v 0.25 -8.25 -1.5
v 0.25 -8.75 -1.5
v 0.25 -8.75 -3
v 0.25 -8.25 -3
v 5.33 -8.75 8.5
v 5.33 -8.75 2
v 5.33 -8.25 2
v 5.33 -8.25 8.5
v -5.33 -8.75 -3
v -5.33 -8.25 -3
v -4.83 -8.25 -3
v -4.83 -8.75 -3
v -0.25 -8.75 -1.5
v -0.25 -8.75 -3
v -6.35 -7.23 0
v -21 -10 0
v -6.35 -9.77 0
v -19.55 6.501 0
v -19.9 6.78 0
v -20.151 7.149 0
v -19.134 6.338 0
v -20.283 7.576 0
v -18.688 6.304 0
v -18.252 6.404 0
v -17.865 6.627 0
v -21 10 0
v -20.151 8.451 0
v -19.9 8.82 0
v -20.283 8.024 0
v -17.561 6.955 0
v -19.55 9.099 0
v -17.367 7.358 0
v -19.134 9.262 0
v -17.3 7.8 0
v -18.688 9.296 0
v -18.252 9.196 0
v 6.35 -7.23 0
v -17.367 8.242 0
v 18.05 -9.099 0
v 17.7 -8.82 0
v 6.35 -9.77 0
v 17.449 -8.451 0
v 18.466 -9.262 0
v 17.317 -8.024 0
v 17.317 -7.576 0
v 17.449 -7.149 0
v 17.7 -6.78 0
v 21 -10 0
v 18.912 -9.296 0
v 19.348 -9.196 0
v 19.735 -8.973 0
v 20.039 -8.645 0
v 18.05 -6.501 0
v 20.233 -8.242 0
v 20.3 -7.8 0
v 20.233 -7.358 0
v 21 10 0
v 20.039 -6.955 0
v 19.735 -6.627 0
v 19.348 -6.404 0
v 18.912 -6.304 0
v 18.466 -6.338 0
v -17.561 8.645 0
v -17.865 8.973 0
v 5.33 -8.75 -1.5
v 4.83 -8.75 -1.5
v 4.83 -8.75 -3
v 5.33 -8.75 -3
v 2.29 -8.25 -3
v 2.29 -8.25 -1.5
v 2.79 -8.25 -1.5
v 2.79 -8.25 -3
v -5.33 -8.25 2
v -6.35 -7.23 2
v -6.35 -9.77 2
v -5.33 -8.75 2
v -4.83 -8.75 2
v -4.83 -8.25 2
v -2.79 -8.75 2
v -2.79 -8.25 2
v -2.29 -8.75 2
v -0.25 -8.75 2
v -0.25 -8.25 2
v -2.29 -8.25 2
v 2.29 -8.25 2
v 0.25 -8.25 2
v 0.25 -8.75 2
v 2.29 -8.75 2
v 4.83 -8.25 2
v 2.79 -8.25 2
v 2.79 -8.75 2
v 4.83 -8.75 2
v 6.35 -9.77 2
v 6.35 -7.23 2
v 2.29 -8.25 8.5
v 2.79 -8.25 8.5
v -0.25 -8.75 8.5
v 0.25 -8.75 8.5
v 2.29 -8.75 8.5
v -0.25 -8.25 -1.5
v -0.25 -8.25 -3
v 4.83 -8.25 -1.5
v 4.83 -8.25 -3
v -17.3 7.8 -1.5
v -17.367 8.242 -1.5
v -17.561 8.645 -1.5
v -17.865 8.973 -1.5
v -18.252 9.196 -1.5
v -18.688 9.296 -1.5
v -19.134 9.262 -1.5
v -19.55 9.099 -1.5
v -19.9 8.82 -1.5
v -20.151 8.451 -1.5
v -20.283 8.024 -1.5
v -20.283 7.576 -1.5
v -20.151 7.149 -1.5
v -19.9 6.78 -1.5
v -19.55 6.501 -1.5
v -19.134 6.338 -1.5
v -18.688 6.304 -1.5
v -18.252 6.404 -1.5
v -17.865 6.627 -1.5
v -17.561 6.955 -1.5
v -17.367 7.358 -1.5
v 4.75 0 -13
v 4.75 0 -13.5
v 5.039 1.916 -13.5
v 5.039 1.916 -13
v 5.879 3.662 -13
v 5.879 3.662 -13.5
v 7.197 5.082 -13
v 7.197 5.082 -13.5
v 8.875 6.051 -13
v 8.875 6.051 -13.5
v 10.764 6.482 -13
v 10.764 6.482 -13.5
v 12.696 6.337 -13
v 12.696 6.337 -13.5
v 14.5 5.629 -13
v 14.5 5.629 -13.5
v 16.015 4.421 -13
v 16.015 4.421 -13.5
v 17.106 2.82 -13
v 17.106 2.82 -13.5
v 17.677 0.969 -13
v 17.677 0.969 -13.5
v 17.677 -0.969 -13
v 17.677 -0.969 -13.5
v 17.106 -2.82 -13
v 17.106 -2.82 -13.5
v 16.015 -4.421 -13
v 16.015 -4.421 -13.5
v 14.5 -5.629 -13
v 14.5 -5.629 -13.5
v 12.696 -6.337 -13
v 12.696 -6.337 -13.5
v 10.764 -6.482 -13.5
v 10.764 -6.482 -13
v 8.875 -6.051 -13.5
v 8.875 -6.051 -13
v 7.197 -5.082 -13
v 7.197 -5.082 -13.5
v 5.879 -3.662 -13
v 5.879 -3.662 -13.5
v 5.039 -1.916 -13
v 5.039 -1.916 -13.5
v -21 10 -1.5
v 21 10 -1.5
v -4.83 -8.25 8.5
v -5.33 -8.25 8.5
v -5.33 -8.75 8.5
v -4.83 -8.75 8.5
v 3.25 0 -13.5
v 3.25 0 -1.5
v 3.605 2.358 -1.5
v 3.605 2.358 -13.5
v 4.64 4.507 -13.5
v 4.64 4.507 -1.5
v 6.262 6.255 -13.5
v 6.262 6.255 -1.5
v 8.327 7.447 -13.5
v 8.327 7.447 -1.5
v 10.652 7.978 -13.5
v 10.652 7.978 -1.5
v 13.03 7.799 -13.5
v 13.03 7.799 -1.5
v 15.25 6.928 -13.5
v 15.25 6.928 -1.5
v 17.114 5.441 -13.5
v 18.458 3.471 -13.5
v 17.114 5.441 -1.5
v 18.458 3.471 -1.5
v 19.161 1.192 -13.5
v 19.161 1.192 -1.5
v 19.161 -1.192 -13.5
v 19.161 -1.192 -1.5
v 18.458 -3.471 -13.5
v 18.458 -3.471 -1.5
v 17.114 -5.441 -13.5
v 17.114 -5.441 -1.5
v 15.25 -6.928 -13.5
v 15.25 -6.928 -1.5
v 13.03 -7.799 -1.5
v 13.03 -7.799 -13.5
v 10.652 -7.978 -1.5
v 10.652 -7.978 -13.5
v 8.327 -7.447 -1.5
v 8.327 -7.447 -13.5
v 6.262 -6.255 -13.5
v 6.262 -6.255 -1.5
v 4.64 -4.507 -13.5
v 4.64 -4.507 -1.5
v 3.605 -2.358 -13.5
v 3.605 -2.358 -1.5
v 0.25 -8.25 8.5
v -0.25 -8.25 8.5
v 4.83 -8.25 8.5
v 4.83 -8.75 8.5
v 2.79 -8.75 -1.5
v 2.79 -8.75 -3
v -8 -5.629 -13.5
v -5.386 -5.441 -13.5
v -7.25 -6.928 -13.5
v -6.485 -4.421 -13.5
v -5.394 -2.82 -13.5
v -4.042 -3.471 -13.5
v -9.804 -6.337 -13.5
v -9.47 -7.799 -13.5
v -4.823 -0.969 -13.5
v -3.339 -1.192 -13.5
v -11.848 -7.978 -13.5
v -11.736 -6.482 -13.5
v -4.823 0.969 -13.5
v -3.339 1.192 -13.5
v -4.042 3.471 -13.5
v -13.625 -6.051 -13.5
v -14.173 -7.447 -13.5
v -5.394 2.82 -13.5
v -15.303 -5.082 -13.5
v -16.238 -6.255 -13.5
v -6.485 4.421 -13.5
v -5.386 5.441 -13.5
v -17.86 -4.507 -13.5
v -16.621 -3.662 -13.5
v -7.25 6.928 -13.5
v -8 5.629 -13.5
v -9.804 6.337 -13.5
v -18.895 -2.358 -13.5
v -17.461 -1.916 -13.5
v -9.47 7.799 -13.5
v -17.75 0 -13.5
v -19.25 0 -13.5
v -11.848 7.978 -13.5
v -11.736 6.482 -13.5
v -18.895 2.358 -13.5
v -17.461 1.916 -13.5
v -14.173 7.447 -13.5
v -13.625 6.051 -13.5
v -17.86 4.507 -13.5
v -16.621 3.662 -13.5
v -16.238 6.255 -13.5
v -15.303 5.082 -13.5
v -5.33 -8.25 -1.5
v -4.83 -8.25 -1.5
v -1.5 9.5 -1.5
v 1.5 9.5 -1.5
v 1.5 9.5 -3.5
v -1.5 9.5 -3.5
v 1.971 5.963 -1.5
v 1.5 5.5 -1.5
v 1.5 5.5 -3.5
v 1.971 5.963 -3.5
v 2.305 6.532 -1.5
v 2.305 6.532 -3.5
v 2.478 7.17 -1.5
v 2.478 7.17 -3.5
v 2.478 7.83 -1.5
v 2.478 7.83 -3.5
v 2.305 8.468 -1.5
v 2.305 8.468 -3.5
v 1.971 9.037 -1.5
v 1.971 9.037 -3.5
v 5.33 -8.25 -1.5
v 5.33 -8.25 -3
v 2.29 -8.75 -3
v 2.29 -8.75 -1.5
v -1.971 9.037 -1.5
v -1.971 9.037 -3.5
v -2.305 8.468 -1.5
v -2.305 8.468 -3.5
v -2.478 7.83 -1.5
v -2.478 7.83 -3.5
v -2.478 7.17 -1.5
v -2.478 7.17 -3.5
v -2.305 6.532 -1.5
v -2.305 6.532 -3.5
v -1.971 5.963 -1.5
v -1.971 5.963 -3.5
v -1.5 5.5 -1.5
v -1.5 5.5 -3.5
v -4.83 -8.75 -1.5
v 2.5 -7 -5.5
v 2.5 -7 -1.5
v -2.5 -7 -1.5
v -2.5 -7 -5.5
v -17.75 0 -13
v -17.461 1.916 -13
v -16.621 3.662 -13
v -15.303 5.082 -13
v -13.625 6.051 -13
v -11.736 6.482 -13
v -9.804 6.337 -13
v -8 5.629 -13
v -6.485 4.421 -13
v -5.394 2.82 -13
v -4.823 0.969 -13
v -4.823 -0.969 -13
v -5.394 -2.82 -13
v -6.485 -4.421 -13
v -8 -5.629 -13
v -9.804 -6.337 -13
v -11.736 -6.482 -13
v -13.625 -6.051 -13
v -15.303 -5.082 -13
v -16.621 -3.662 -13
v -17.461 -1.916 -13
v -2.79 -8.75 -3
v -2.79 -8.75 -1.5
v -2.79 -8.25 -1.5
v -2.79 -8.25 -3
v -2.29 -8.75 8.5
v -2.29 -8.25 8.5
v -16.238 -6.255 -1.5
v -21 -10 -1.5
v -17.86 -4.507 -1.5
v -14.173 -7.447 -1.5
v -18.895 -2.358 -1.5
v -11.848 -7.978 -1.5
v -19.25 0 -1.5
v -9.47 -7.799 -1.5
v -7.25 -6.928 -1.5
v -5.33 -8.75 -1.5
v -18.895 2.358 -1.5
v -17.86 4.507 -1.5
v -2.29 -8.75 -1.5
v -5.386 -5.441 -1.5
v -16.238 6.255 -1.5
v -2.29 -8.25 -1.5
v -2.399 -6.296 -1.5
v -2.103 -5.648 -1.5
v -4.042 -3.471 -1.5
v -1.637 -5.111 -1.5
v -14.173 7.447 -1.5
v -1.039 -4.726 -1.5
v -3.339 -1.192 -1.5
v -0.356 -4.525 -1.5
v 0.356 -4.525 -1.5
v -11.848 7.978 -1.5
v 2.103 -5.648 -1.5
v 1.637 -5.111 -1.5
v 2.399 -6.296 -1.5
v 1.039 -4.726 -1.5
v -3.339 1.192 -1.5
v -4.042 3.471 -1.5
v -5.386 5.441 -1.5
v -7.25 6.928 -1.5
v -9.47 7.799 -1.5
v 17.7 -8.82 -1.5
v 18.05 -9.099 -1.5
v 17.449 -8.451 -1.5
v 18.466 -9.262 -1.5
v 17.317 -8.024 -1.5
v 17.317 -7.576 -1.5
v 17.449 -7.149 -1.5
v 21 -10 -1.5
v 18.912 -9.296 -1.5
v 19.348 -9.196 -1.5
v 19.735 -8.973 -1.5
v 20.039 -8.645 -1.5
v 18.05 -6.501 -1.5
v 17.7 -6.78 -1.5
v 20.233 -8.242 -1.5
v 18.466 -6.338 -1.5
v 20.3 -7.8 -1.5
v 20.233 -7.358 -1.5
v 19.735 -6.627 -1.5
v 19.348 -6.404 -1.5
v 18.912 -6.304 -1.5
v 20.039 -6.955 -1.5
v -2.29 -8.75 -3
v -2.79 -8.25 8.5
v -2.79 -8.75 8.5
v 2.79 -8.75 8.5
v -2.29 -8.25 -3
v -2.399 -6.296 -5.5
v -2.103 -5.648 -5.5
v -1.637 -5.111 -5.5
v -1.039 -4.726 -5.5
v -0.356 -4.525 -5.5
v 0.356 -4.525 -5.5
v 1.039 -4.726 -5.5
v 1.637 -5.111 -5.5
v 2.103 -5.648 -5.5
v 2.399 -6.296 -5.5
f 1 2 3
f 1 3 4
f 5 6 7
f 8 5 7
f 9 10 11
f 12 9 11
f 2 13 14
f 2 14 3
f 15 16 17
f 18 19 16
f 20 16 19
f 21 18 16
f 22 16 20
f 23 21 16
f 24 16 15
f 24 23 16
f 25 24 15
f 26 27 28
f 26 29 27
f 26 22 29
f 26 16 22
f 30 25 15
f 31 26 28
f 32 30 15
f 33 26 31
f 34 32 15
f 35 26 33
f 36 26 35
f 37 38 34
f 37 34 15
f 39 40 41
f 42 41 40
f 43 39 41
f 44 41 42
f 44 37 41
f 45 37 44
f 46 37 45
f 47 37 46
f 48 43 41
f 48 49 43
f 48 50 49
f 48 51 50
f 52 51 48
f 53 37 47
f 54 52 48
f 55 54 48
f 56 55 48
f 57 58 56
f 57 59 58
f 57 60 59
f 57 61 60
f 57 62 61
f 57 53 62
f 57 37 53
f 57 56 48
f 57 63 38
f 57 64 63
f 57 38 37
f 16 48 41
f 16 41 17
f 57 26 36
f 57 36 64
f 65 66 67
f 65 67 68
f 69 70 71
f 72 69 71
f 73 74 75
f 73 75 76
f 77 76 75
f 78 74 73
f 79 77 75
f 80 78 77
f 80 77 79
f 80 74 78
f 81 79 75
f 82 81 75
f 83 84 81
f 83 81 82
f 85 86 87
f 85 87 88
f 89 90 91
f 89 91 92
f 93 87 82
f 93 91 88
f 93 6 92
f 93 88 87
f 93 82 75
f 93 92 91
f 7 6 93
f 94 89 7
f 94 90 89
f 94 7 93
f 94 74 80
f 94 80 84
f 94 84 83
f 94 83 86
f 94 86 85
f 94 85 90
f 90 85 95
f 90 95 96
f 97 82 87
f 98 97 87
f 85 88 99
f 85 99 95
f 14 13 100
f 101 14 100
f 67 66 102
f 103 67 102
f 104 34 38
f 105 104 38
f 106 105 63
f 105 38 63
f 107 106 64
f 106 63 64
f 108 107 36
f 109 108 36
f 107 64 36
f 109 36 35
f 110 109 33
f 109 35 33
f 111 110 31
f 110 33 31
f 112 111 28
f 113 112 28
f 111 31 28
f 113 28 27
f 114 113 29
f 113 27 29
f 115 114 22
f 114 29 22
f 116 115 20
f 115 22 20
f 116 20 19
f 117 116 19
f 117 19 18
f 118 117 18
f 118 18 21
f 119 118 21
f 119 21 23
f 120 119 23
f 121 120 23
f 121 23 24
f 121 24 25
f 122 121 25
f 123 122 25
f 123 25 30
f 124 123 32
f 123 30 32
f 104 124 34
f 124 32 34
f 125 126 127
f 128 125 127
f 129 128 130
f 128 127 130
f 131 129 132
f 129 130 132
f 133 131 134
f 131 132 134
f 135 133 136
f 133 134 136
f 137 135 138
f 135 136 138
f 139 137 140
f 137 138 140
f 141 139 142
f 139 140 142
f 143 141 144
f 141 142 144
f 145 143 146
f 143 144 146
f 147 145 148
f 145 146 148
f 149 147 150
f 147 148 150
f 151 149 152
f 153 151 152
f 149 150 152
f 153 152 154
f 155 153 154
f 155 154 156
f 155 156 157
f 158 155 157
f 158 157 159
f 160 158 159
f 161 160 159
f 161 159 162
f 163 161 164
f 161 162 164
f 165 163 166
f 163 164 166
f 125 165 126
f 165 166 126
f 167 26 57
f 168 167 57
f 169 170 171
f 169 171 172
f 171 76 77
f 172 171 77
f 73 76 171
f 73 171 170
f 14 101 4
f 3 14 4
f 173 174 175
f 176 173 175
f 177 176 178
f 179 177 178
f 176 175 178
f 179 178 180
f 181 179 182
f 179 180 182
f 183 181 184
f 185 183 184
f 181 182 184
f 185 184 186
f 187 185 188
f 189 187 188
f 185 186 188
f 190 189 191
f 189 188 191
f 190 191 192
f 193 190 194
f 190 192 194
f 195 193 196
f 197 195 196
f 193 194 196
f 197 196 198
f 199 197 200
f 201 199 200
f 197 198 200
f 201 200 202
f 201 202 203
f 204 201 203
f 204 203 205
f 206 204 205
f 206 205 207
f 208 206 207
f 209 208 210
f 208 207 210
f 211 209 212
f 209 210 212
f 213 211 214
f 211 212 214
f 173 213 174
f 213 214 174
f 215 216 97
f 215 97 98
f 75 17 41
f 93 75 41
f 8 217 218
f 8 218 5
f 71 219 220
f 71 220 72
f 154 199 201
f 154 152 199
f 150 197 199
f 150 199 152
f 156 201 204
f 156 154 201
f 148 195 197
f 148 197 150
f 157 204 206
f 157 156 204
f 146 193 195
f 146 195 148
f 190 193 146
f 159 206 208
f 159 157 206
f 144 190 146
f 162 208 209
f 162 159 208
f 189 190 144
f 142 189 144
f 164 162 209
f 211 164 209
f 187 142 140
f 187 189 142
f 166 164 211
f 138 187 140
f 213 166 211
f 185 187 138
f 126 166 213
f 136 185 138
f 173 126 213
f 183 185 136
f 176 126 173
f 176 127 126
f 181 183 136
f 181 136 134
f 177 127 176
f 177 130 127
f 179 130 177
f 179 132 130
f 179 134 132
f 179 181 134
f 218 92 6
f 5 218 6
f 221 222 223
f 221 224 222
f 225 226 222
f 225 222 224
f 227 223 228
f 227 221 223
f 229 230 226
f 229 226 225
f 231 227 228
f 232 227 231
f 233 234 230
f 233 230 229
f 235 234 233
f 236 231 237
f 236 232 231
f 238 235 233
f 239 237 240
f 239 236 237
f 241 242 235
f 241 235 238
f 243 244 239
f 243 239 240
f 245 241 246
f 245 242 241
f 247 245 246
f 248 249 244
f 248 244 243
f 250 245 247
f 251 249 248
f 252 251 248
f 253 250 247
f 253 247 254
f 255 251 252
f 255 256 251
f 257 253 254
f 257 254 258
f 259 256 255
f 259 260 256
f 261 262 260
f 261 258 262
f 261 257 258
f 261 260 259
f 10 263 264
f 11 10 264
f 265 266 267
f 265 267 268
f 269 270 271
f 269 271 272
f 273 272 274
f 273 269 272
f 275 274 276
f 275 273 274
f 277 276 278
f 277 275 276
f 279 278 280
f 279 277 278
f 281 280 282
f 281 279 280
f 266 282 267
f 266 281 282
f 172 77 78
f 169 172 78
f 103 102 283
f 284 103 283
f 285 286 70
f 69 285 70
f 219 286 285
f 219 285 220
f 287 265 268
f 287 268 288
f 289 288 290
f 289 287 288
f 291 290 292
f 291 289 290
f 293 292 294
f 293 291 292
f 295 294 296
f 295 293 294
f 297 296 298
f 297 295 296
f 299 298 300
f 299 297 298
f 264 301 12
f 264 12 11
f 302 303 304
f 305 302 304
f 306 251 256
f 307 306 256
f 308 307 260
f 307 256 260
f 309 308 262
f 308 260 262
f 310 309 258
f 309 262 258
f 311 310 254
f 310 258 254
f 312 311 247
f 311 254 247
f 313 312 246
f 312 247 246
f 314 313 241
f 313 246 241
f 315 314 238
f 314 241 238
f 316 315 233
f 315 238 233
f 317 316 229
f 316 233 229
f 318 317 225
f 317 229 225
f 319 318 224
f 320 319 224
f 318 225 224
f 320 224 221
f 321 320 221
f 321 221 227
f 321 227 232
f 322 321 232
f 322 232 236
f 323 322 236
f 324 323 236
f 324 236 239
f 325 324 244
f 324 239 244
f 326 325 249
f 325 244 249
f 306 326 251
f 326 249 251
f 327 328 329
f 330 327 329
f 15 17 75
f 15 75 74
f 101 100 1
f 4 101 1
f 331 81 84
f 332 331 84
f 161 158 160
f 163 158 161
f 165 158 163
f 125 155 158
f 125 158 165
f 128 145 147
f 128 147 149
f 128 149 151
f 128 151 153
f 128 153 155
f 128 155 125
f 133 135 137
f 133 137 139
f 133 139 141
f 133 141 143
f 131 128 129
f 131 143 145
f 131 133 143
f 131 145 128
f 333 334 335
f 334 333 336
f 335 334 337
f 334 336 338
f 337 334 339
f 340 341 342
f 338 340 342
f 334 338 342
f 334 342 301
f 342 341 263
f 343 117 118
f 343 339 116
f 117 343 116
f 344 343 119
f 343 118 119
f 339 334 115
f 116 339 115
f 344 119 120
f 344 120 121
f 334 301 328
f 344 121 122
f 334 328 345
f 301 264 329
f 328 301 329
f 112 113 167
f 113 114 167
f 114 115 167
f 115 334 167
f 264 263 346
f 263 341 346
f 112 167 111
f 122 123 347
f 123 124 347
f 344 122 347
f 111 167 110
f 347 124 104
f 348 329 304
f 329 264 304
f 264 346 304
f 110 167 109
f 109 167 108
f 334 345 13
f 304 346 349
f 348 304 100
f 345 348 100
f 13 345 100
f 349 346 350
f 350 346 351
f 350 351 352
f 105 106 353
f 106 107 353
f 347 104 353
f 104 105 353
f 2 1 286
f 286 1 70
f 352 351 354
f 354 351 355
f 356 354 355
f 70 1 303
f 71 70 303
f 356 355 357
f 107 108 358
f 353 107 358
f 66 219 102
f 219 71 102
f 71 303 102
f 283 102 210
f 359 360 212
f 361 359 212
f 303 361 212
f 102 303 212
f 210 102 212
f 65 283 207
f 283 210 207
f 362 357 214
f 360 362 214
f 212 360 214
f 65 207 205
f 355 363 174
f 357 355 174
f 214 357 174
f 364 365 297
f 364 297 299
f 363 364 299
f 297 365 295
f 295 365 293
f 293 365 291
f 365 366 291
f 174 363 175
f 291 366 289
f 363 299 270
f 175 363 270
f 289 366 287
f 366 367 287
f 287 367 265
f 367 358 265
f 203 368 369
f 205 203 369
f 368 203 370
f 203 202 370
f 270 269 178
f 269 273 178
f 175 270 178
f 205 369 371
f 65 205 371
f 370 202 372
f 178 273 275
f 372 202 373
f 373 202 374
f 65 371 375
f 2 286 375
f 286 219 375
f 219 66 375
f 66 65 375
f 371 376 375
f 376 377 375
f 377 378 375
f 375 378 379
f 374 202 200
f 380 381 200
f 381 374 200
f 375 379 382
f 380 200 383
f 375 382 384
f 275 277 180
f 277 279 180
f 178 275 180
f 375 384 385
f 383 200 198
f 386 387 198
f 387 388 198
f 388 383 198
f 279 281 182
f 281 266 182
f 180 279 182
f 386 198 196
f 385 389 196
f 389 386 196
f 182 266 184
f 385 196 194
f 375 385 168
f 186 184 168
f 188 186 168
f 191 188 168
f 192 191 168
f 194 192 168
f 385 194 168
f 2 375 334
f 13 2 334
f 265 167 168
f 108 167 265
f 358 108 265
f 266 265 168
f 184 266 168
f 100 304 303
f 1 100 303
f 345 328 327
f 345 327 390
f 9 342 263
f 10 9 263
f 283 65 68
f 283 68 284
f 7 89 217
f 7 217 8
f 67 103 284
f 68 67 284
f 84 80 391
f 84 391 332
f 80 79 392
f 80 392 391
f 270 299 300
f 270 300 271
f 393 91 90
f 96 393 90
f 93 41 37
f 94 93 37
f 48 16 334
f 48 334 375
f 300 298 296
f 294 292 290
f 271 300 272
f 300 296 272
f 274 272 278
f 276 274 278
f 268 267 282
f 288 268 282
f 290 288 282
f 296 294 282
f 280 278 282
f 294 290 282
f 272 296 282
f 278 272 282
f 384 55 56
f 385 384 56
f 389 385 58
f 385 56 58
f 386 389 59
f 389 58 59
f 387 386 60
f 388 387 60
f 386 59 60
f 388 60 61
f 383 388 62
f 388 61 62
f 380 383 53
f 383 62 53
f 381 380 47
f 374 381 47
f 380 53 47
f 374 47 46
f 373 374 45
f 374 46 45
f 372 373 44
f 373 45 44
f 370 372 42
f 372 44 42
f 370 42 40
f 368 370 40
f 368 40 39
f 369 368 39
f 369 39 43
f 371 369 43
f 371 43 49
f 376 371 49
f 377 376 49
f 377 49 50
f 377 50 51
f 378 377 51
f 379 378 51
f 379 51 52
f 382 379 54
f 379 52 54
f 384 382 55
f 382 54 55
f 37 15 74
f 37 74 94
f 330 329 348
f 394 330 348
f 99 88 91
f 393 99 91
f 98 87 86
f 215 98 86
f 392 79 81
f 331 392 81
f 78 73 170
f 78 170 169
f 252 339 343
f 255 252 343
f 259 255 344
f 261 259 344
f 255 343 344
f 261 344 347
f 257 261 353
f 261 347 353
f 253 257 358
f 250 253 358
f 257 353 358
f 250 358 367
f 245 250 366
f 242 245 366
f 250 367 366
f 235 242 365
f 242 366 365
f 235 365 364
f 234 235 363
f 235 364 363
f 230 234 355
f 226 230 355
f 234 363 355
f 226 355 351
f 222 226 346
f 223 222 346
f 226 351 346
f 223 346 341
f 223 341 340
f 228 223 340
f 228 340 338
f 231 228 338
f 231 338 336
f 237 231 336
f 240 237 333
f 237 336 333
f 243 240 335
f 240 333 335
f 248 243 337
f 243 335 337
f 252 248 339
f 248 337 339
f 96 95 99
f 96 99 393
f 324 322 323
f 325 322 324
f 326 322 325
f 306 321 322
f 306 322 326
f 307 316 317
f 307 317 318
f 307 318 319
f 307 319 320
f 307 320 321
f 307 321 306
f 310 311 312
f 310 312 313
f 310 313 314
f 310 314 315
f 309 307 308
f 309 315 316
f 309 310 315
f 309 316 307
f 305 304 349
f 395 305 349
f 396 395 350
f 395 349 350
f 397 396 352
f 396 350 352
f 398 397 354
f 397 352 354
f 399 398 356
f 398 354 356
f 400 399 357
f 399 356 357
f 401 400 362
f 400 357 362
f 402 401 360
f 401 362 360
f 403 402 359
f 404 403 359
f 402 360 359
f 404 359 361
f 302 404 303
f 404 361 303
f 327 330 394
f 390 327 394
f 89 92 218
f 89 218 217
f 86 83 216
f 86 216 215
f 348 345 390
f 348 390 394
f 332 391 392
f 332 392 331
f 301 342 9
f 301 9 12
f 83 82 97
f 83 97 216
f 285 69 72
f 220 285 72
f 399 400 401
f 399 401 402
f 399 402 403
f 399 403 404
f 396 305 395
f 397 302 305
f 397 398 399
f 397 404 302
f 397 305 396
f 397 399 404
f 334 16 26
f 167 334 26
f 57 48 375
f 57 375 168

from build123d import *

# Parameters (mm, degrees)
CROQUIS1_W                   = 42
CROQUIS1_H                   = 20
CROQUIS1_R                   = 1.5
SALIENTE_EXTRUIR1_DEPTH      = 1.5
CROQUIS2_R                   = 8
SALIENTE_EXTRUIR2_DEPTH      = 12
CROQUIS3_R                   = 6.5
CORTAR_EXTRUIR1_DEPTH        = 0.5
CROQUIS5_W                   = 0.5
CROQUIS5_H                   = 0.5
SALIENTE_EXTRUIR3_DEPTH      = 8.5
SALIENTE_EXTRUIR3_DEPTH_BACK = 3
CROQUIS6_W                   = 12.7
CROQUIS6_H                   = 2.54
SALIENTE_EXTRUIR4_DEPTH      = 2
SALIENTE_EXTRUIR5_DEPTH      = 4
SALIENTE_EXTRUIR6_DEPTH      = 2


with BuildPart() as part:
    # Croquis1 → Saliente-Extruir1 (new body)
    with BuildSketch(Plane.XY):
        Rectangle(CROQUIS1_W, CROQUIS1_H)
        with Locations((-18.8, 7.8)):
            Circle(CROQUIS1_R, mode=Mode.SUBTRACT)
        with Locations((18.8, -7.8)):
            Circle(CROQUIS1_R, mode=Mode.SUBTRACT)
    extrude(amount=-SALIENTE_EXTRUIR1_DEPTH)

    # Croquis2 → Saliente-Extruir2 (add)
    with BuildSketch(Plane(origin=(0, 0, -1.5), x_dir=(-1, 0, 0), z_dir=(0, 0, -1))):
        with Locations((-11.25, 0)):
            Circle(CROQUIS2_R)
        with Locations((11.25, 0)):
            Circle(CROQUIS2_R)
    extrude(amount=SALIENTE_EXTRUIR2_DEPTH)

    # Croquis3 → Cortar-Extruir1 (cut)
    with BuildSketch(Plane(origin=(0, 0, -13.5), x_dir=(-1, 0, 0), z_dir=(0, 0, -1))):
        with Locations((-11.25, 0)):
            Circle(CROQUIS3_R)
        with Locations((11.25, 0)):
            Circle(CROQUIS3_R)
    extrude(amount=-CORTAR_EXTRUIR1_DEPTH, mode=Mode.SUBTRACT)

    # Croquis5 → Saliente-Extruir3 (add, two sides)
    with BuildSketch(Plane.XY) as saliente_extruir3_sk:
        with Locations((0, -8.5)):
            Rectangle(CROQUIS5_W, CROQUIS5_H)
        with Locations((-2.54, -8.5)):
            Rectangle(CROQUIS5_W, CROQUIS5_H)
        with Locations((-5.08, -8.5)):
            Rectangle(CROQUIS5_W, CROQUIS5_H)
        with Locations((2.54, -8.5)):
            Rectangle(CROQUIS5_W, CROQUIS5_H)
        with Locations((5.08, -8.5)):
            Rectangle(CROQUIS5_W, CROQUIS5_H)
    extrude(amount=SALIENTE_EXTRUIR3_DEPTH)
    extrude(saliente_extruir3_sk.sketch, amount=-SALIENTE_EXTRUIR3_DEPTH_BACK)

    # Croquis6 → Saliente-Extruir4 (add)
    with BuildSketch(Plane.XY):
        with Locations((0, -8.5)):
            Rectangle(CROQUIS6_W, CROQUIS6_H)
    extrude(amount=SALIENTE_EXTRUIR4_DEPTH)

    # Croquis7 → Saliente-Extruir5 (add)
    with BuildSketch(Plane(origin=(0, 0, -1.5), x_dir=(-1, 0, 0), z_dir=(0, 0, -1))):
        with BuildLine():
            Line((-2.5, -7), (0, -7))
            Line((0, -7), (2.5, -7))
            ThreePointArc((2.5, -7), (0, -4.5), (-2.5, -7))
        make_face()
    extrude(amount=SALIENTE_EXTRUIR5_DEPTH)

    # Croquis8 → Saliente-Extruir6 (add)
    with BuildSketch(Plane(origin=(0, 0, -1.5), x_dir=(-1, 0, 0), z_dir=(0, 0, -1))):
        with BuildLine():
            Line((-1.5, 9.5), (1.5, 9.5))
            ThreePointArc((1.5, 9.5), (2.5, 7.5), (1.5, 5.5))
            Line((1.5, 5.5), (-1.5, 5.5))
            ThreePointArc((-1.5, 5.5), (-2.5, 7.5), (-1.5, 9.5))
        make_face()
    extrude(amount=SALIENTE_EXTRUIR6_DEPTH)


solid = part.part
